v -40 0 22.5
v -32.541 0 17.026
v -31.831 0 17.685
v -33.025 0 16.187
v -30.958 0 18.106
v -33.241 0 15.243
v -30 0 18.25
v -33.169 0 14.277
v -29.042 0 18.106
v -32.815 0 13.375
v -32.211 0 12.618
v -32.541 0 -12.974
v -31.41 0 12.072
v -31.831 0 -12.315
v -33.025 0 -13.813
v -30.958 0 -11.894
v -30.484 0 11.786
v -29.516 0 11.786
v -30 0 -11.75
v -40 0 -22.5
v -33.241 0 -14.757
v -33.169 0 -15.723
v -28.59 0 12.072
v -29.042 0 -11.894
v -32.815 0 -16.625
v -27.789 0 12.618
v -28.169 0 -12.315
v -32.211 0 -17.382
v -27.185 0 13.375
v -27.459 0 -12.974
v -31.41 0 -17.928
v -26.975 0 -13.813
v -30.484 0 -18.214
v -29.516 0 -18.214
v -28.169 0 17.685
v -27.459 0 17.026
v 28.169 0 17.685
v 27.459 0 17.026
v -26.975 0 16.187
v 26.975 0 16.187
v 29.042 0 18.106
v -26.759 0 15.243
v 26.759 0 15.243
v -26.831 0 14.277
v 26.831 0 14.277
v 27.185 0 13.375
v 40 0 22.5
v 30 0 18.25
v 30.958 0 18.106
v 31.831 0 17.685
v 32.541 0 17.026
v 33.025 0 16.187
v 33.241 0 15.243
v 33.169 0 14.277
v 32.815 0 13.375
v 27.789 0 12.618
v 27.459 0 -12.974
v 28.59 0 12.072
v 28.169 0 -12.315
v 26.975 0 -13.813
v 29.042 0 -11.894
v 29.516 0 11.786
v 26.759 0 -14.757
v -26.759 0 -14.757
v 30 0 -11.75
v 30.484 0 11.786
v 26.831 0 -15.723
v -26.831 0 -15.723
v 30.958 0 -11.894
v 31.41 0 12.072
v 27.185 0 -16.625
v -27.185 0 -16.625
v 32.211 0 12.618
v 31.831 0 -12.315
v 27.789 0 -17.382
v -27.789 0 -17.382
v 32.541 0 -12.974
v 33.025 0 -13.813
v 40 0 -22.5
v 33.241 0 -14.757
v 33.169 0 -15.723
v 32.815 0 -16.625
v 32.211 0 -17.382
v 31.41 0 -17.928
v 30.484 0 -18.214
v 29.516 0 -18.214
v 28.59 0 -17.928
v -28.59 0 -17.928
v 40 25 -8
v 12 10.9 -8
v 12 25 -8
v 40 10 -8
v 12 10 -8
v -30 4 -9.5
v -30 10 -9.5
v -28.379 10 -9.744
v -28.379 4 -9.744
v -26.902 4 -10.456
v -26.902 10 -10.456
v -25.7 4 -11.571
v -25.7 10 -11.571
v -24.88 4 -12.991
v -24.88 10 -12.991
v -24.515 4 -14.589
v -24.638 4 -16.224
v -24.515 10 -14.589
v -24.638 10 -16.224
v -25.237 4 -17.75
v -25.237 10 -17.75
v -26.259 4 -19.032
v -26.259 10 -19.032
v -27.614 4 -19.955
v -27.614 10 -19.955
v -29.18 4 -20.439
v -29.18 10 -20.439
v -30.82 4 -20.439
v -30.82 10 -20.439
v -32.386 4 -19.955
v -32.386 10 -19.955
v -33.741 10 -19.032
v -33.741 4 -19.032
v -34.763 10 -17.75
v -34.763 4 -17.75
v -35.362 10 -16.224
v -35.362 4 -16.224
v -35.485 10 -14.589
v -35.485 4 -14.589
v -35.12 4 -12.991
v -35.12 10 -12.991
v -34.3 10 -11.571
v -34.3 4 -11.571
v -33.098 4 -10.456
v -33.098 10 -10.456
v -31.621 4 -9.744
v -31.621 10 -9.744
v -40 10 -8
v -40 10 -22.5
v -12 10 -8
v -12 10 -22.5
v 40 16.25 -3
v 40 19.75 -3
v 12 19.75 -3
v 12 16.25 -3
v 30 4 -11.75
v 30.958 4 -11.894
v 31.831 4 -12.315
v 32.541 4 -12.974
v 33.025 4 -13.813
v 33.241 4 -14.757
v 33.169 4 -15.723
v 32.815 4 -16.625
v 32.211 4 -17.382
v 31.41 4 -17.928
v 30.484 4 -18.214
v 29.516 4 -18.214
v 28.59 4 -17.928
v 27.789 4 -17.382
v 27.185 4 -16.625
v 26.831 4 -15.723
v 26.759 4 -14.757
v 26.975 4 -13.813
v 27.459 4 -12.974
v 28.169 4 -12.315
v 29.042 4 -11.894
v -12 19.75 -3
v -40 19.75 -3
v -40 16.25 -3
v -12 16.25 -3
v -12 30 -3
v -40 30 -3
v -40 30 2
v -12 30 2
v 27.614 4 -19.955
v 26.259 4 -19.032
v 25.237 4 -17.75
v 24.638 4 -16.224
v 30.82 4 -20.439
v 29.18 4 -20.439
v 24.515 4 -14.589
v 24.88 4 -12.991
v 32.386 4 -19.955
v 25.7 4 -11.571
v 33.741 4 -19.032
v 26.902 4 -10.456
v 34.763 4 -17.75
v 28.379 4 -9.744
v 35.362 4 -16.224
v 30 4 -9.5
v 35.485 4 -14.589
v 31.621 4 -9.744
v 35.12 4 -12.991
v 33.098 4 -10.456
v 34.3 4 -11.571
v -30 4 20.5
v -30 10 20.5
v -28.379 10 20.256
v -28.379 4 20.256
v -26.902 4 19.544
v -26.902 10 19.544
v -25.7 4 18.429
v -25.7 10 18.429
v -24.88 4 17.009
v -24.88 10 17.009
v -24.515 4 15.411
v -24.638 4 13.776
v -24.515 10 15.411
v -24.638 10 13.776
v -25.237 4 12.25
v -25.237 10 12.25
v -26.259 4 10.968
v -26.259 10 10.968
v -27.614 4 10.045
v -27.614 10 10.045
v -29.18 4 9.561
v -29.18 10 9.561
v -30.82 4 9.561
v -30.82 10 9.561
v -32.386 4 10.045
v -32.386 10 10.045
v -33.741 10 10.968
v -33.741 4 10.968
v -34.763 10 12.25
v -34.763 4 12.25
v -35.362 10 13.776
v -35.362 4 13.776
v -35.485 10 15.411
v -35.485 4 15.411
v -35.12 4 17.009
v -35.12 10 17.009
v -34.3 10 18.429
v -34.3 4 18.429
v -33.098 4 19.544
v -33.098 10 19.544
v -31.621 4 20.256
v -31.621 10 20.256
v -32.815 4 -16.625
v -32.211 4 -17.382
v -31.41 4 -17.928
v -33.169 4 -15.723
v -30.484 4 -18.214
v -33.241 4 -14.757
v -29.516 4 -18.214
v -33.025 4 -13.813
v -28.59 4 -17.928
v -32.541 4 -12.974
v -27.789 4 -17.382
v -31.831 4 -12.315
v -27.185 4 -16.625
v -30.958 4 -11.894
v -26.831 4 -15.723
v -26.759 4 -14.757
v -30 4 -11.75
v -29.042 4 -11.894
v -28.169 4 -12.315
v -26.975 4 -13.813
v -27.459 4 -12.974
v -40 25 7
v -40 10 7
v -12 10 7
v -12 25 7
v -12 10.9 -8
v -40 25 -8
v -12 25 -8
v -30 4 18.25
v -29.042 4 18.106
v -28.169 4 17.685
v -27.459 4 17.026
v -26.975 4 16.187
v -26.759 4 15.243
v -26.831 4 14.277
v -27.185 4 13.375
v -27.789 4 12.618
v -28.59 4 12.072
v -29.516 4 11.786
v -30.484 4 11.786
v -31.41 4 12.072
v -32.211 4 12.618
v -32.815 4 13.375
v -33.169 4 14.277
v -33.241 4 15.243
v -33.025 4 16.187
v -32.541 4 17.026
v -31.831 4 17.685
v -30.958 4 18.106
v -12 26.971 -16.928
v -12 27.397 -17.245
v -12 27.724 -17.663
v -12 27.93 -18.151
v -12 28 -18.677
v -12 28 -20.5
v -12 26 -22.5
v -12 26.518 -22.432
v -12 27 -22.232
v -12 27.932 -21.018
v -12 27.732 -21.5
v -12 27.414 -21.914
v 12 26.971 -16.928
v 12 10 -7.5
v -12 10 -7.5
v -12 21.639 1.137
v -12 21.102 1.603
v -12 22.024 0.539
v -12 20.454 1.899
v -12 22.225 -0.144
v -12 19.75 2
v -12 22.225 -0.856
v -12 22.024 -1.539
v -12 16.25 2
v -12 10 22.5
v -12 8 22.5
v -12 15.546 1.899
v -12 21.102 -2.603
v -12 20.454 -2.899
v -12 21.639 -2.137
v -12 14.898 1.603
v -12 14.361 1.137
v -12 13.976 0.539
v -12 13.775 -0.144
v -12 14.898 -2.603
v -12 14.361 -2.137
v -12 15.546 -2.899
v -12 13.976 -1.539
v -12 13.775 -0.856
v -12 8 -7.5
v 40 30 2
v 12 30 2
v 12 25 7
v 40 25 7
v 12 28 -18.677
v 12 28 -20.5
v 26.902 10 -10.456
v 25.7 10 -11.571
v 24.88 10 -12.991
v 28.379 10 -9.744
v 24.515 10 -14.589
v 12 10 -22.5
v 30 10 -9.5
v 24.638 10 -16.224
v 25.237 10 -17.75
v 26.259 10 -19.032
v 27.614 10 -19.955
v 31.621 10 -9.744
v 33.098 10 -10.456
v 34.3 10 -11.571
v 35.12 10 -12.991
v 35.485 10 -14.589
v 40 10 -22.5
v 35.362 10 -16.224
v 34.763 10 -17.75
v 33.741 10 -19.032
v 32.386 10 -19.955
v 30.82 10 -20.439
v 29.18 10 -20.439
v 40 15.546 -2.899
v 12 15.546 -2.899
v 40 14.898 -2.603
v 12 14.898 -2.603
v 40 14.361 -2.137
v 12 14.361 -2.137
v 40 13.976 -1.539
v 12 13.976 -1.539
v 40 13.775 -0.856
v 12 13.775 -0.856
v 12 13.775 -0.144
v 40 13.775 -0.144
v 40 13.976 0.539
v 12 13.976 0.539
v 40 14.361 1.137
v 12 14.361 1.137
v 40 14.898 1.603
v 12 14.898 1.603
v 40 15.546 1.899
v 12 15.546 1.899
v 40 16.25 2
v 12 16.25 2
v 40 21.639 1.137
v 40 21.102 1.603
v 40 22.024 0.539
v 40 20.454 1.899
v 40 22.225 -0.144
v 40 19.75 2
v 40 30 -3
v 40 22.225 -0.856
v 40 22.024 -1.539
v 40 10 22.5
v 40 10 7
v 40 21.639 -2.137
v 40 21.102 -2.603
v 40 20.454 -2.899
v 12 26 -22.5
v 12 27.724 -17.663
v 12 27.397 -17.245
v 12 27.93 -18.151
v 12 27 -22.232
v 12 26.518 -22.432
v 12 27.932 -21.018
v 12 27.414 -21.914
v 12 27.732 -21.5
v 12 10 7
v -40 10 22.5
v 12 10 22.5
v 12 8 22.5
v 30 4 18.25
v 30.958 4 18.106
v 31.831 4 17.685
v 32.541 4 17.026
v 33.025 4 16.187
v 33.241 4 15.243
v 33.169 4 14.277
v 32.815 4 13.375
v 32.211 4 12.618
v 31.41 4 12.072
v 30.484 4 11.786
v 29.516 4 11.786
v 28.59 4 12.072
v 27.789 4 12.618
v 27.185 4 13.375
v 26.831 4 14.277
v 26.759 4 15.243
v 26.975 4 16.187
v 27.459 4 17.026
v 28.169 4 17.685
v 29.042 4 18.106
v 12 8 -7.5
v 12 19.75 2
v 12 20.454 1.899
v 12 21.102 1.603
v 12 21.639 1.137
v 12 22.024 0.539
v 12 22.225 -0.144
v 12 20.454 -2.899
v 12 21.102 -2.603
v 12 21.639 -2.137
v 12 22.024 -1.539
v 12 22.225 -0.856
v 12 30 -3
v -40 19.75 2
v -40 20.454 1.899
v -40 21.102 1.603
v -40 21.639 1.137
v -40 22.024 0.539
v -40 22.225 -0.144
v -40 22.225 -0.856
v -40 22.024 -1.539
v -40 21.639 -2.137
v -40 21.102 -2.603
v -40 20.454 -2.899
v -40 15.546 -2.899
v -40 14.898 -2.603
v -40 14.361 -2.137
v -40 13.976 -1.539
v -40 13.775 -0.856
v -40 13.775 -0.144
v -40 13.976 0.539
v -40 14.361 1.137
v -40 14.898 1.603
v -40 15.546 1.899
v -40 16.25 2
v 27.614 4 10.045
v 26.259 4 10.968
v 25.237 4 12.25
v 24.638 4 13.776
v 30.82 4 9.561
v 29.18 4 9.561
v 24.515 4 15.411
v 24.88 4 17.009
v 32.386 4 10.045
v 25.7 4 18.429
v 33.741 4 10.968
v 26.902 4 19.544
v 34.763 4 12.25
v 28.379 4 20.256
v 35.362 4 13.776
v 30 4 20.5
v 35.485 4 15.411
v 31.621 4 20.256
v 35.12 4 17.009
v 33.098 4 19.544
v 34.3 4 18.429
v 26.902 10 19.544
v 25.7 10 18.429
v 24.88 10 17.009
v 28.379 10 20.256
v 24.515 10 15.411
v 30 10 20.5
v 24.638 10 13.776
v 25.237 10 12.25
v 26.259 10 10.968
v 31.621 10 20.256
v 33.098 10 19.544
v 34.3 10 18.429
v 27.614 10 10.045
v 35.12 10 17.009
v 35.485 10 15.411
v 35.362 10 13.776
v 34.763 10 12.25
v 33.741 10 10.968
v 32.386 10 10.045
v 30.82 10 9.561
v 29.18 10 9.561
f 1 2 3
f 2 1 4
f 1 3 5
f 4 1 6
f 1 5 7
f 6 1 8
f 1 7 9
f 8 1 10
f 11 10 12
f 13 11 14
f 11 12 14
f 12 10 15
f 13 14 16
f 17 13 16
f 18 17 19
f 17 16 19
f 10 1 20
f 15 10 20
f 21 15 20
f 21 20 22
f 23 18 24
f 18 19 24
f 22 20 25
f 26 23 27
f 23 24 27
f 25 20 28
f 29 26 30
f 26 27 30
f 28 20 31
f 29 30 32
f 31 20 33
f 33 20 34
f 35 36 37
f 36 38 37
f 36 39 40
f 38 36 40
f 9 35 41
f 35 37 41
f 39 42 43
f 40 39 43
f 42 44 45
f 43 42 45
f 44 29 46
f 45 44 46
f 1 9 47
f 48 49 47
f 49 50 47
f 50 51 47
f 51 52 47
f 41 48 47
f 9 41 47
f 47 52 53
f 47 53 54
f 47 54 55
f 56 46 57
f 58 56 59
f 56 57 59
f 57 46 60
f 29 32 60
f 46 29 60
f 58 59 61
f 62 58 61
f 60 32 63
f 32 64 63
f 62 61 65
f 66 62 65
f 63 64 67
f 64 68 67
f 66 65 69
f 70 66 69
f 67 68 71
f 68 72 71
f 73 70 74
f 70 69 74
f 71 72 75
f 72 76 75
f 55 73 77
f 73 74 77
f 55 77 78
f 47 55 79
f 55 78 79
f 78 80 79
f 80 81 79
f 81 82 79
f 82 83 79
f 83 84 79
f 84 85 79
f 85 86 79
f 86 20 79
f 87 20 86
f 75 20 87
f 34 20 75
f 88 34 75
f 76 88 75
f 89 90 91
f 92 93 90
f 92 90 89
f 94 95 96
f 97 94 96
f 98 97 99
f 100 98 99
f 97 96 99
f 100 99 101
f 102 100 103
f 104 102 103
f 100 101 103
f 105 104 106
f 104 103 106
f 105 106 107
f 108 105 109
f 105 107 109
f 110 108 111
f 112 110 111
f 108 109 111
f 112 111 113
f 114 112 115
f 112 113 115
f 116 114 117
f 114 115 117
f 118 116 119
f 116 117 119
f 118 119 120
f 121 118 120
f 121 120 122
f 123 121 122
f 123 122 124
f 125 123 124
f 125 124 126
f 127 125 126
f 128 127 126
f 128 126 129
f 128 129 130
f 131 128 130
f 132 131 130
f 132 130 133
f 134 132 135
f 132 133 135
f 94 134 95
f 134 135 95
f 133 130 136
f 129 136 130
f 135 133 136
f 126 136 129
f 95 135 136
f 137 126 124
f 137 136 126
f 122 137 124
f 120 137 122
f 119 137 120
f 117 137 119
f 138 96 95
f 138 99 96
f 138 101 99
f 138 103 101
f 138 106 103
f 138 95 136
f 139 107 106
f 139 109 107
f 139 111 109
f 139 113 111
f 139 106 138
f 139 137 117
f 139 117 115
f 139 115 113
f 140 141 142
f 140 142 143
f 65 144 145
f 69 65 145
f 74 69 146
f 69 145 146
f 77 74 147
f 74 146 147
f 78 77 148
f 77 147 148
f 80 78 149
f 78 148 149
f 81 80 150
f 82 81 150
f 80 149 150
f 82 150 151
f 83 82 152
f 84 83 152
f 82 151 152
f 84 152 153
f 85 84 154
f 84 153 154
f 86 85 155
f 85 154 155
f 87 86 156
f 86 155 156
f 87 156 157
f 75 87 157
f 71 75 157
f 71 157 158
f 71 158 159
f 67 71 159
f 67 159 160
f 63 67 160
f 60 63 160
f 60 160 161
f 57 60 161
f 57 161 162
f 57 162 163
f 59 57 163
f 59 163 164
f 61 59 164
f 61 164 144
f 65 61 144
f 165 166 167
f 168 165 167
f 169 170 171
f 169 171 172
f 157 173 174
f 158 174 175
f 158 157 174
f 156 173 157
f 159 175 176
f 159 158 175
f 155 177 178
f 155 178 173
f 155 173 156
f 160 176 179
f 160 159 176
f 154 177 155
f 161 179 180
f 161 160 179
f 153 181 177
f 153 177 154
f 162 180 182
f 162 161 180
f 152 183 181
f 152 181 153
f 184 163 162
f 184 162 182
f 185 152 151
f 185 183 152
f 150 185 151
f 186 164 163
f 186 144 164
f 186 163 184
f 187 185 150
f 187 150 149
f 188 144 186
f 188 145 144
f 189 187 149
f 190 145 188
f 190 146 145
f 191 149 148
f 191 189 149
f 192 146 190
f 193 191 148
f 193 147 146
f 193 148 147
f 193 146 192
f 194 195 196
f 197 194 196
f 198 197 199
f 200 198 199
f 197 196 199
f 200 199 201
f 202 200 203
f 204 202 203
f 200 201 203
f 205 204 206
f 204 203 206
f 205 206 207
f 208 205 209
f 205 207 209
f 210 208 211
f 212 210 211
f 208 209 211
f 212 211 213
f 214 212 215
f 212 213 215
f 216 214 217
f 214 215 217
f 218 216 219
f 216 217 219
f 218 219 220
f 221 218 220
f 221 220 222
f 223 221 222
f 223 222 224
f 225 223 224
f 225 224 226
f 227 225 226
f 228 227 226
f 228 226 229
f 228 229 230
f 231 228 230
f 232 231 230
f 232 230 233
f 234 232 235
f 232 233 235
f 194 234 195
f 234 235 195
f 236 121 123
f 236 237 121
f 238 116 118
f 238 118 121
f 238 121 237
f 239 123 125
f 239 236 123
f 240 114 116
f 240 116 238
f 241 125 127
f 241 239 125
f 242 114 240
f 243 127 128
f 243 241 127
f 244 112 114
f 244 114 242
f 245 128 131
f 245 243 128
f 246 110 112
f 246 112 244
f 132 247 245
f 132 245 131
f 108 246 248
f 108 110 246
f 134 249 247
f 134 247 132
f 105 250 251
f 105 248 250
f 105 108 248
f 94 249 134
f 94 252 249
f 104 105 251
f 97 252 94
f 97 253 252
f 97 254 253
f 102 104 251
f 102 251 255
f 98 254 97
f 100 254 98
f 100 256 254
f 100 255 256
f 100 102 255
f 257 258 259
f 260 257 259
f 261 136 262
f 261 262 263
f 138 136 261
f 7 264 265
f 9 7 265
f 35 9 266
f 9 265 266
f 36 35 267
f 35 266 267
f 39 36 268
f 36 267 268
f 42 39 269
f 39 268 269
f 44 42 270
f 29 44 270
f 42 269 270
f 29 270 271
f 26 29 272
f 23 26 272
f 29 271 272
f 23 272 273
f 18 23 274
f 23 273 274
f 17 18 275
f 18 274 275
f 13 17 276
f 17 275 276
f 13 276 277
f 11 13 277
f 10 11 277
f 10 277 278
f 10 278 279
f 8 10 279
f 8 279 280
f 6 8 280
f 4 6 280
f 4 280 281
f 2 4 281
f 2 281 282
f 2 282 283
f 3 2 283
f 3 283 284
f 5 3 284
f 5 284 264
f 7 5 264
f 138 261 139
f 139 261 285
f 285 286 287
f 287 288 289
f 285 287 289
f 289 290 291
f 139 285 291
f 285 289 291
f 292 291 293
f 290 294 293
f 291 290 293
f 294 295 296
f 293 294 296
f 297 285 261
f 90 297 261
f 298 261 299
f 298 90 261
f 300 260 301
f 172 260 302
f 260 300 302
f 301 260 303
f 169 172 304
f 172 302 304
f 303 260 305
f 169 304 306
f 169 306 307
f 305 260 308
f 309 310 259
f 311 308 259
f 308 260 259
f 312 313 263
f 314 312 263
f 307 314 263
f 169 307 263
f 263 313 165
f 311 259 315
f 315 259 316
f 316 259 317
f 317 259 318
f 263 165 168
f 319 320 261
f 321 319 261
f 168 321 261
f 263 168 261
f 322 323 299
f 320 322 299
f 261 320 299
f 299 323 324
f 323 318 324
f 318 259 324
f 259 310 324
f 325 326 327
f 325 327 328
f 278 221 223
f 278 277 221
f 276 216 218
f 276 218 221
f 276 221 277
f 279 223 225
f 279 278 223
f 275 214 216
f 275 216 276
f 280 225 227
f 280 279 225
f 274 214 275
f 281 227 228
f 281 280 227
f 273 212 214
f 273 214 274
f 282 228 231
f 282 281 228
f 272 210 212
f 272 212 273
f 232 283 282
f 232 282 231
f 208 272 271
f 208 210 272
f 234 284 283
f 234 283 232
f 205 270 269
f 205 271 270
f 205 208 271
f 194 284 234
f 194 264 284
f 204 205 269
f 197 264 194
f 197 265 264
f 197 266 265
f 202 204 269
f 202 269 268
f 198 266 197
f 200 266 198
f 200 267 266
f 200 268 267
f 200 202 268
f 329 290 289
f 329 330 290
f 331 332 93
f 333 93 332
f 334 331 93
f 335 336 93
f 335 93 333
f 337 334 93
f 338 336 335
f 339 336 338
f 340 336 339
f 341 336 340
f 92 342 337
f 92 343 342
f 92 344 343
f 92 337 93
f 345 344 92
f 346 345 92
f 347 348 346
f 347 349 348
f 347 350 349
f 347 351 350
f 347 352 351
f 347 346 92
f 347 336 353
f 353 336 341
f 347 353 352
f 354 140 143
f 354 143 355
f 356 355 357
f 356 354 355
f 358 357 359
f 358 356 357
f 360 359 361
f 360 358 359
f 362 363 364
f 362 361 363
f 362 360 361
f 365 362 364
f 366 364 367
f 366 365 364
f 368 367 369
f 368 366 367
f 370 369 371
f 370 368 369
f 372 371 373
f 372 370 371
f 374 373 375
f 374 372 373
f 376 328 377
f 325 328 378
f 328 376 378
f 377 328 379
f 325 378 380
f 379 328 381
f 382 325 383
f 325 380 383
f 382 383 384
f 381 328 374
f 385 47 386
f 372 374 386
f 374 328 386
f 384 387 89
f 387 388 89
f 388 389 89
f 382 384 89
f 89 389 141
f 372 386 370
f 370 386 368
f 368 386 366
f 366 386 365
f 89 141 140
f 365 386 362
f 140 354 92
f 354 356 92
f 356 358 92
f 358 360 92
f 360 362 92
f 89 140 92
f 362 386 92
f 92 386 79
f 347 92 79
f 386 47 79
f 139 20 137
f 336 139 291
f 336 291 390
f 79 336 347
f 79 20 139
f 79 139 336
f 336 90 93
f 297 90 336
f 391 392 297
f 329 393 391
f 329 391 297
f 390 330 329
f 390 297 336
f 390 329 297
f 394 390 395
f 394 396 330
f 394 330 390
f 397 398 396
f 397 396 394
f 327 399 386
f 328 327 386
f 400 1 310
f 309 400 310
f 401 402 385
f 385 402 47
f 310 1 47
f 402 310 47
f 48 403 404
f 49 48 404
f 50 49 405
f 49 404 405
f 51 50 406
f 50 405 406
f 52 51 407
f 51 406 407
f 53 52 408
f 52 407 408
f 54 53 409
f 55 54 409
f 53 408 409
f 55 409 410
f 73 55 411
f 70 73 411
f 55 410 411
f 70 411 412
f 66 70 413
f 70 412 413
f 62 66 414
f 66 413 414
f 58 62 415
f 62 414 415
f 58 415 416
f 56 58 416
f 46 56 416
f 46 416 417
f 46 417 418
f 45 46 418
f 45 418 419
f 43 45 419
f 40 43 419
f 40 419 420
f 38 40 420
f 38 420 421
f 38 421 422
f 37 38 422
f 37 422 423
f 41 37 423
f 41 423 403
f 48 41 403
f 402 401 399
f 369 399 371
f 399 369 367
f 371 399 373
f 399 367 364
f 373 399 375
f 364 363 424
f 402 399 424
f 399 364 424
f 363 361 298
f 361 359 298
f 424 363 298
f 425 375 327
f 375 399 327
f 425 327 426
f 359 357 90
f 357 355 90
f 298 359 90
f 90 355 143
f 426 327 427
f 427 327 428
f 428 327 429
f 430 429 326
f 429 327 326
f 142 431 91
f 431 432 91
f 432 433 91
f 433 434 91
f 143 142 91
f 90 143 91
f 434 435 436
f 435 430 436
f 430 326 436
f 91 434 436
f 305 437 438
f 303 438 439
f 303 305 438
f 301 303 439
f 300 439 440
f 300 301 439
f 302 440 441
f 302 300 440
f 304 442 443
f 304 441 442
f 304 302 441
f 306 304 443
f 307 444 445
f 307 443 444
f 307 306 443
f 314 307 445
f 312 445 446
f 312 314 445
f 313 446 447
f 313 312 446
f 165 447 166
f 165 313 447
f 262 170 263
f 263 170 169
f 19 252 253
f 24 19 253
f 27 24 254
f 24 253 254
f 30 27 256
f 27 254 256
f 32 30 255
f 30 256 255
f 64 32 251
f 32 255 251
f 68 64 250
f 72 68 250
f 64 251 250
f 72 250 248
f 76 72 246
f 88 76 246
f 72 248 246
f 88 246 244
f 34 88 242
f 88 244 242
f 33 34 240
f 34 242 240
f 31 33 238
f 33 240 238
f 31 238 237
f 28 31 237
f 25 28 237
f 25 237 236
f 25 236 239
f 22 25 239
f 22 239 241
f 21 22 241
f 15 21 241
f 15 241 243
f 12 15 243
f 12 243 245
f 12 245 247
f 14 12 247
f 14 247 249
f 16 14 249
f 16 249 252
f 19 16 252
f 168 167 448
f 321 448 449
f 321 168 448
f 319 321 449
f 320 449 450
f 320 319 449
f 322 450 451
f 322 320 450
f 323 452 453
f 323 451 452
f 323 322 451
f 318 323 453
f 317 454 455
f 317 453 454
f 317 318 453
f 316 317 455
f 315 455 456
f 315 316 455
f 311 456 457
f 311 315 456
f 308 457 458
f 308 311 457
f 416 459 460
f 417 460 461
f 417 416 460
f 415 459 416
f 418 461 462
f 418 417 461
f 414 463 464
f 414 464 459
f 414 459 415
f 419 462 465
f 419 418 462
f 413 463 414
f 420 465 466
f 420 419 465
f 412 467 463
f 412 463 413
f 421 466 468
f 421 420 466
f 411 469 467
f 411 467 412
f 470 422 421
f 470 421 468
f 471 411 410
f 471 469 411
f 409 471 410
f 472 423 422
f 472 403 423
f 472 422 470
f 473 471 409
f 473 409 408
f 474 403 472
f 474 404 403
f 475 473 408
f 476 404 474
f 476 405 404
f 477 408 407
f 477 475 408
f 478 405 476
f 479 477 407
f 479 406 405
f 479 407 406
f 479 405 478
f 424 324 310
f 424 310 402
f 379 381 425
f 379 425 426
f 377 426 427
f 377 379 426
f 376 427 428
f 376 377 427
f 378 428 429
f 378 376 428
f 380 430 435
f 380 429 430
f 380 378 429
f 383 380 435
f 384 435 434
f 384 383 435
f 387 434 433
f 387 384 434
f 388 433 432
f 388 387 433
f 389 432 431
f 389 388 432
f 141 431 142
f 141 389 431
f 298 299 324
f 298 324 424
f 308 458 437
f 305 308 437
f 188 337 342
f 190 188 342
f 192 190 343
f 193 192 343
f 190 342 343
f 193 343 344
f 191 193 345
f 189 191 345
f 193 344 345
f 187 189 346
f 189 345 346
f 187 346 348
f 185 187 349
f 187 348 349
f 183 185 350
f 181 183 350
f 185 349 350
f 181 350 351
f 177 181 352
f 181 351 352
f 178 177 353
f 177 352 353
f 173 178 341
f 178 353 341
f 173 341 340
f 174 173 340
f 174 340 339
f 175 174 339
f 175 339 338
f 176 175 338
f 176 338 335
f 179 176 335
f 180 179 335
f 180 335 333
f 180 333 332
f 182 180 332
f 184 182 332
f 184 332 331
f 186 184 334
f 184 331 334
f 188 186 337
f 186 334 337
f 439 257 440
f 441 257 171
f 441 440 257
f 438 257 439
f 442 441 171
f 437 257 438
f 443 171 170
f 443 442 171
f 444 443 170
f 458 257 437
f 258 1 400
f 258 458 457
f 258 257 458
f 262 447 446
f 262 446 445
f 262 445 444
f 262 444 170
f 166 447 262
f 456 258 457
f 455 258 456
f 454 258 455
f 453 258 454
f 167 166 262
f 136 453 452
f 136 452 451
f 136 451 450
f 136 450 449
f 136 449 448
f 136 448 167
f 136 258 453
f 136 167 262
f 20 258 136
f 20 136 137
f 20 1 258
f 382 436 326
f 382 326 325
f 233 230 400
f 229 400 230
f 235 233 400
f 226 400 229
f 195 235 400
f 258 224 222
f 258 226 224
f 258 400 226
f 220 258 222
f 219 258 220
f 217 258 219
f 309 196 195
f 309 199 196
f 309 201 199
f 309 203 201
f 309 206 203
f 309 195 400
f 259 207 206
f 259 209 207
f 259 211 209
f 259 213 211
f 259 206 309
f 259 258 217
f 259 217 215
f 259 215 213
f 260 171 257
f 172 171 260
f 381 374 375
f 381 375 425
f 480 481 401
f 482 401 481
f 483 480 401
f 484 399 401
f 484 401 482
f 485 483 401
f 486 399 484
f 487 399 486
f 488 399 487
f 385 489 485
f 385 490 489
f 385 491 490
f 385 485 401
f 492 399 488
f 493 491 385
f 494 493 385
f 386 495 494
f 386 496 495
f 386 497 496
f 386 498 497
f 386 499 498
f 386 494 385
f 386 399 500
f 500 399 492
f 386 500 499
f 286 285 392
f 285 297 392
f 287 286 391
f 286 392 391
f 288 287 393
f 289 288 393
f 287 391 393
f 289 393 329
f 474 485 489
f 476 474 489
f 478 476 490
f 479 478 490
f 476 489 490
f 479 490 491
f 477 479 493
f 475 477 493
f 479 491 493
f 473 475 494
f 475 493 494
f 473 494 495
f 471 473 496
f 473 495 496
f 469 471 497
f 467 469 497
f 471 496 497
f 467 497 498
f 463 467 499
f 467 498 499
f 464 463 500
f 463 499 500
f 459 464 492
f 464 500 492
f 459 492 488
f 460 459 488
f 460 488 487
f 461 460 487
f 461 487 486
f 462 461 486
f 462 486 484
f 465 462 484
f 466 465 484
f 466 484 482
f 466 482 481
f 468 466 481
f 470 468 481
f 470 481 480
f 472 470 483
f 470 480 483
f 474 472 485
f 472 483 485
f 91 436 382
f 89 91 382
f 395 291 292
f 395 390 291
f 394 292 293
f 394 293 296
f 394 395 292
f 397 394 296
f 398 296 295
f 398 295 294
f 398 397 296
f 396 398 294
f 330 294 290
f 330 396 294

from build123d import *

# Parameters (mm, degrees)
SKETCH_2_W          = 80
SKETCH_2_H          = 45
EXTRUDE_1_DEPTH     = 10
EXTRUDE_2_DEPTH     = 12
FILLET_1_R          = 2
SKETCH_4_W          = 24
SKETCH_4_H          = 30
CUT_EXTRUDE_1_DEPTH = 2
SKETCH_5_W          = 28
SKETCH_5_H          = 15
EXTRUDE_3_DEPTH     = 20
CHAMFER_1_SIZE      = 5
CUT_EXTRUDE_2_DEPTH = 89.352985235
SKETCH_8_R          = 5.5
CUT_EXTRUDE_3_DEPTH = 6
SKETCH_9_R          = 3.25
CUT_EXTRUDE_4_DEPTH = 53.747037832


with BuildPart() as part:
    # 스케치2 → 보스-돌출1 (new body)
    with BuildSketch(Plane(origin=(0, 0, 0), x_dir=(1, 0, 0), z_dir=(0, 1, 0))):
        Rectangle(SKETCH_2_W, SKETCH_2_H)
    extrude(amount=EXTRUDE_1_DEPTH)

    # 스케치3 → 보스-돌출2 (add, symmetric)
    with BuildSketch(Plane(origin=(0, 0, 0), x_dir=(0, 0, -1), z_dir=(1, 0, 0))):
        Polygon((22.5, 10), (22.5, 28), (17.5, 28), (7.5, 10), align=None)
    extrude(amount=EXTRUDE_2_DEPTH, both=True)

    # 필렛1
    fillet_1_edges = [part.edges().sort_by_distance(p)[0] for p in [
        (0, 28, -22.5),
        (0, 28, -17.5),
    ]]
    fillet(fillet_1_edges, radius=FILLET_1_R)

    # 스케치4 → 컷-돌출1 (cut)
    with BuildSketch(Plane(origin=(0, 10, 0), x_dir=(1, 0, 0), z_dir=(0, 1, 0))):
        with Locations((0, -7.5)):
            Rectangle(SKETCH_4_W, SKETCH_4_H)
    extrude(amount=-CUT_EXTRUDE_1_DEPTH, mode=Mode.SUBTRACT)

    # 스케치5 → 보스-돌출3 (add)
    with BuildSketch(Plane(origin=(0, 10, 0), x_dir=(1, 0, 0), z_dir=(0, 1, 0))):
        with Locations((-26, 0.5)):
            Rectangle(SKETCH_5_W, SKETCH_5_H)
        with Locations((26, 0.5)):
            Rectangle(SKETCH_5_W, SKETCH_5_H)
    extrude(amount=EXTRUDE_3_DEPTH)

    # 모따기1
    chamfer_1_edges = [part.edges().sort_by_distance(p)[0] for p in [
        (-26, 30, 7),
        (-26, 30, -8),
        (26, 30, -8),
        (26, 30, 7),
    ]]
    chamfer(chamfer_1_edges, length=CHAMFER_1_SIZE)

    # 스케치6 → 컷-돌출2 (cut, through all)
    with BuildSketch(Plane(origin=(40, 0, 0), x_dir=(0, 0, -1), z_dir=(1, 0, 0))):
        with BuildLine():
            Line((3, 19.75), (3, 16.25))
            ThreePointArc((3, 16.25), (0.5, 13.75), (-2, 16.25))
            Line((-2, 16.25), (-2, 19.75))
            ThreePointArc((-2, 19.75), (0.5, 22.25), (3, 19.75))
        make_face()
    extrude(amount=-CUT_EXTRUDE_2_DEPTH, mode=Mode.SUBTRACT)

    # 스케치8 → 컷-돌출3 (cut)
    with BuildSketch(Plane(origin=(0, 10, 0), x_dir=(1, 0, 0), z_dir=(0, 1, 0))):
        with Locations(Location((-30, 15, 0), (0, 0, 270))):
            Circle(SKETCH_8_R)
        with Locations(Location((-30, -15, 0), (0, 0, 270))):
            Circle(SKETCH_8_R)
        with Locations(Location((30, -15, 0), (0, 0, 270))):
            Circle(SKETCH_8_R)
        with Locations(Location((30, 15, 0), (0, 0, 270))):
            Circle(SKETCH_8_R)
    extrude(amount=-CUT_EXTRUDE_3_DEPTH, mode=Mode.SUBTRACT)

    # 스케치9 → 컷-돌출4 (cut, through all)
    with BuildSketch(Plane(origin=(0, 4, 0), x_dir=(1, 0, 0), z_dir=(0, 1, 0))):
        with Locations(Location((-30, 15, 0), (0, 0, 270))):
            Circle(SKETCH_9_R)
        with Locations(Location((30, 15, 0), (0, 0, 270))):
            Circle(SKETCH_9_R)
        with Locations(Location((30, -15, 0), (0, 0, 270))):
            Circle(SKETCH_9_R)
        with Locations(Location((-30, -15, 0), (0, 0, 270))):
            Circle(SKETCH_9_R)
    extrude(amount=-CUT_EXTRUDE_4_DEPTH, mode=Mode.SUBTRACT)


solid = part.part
